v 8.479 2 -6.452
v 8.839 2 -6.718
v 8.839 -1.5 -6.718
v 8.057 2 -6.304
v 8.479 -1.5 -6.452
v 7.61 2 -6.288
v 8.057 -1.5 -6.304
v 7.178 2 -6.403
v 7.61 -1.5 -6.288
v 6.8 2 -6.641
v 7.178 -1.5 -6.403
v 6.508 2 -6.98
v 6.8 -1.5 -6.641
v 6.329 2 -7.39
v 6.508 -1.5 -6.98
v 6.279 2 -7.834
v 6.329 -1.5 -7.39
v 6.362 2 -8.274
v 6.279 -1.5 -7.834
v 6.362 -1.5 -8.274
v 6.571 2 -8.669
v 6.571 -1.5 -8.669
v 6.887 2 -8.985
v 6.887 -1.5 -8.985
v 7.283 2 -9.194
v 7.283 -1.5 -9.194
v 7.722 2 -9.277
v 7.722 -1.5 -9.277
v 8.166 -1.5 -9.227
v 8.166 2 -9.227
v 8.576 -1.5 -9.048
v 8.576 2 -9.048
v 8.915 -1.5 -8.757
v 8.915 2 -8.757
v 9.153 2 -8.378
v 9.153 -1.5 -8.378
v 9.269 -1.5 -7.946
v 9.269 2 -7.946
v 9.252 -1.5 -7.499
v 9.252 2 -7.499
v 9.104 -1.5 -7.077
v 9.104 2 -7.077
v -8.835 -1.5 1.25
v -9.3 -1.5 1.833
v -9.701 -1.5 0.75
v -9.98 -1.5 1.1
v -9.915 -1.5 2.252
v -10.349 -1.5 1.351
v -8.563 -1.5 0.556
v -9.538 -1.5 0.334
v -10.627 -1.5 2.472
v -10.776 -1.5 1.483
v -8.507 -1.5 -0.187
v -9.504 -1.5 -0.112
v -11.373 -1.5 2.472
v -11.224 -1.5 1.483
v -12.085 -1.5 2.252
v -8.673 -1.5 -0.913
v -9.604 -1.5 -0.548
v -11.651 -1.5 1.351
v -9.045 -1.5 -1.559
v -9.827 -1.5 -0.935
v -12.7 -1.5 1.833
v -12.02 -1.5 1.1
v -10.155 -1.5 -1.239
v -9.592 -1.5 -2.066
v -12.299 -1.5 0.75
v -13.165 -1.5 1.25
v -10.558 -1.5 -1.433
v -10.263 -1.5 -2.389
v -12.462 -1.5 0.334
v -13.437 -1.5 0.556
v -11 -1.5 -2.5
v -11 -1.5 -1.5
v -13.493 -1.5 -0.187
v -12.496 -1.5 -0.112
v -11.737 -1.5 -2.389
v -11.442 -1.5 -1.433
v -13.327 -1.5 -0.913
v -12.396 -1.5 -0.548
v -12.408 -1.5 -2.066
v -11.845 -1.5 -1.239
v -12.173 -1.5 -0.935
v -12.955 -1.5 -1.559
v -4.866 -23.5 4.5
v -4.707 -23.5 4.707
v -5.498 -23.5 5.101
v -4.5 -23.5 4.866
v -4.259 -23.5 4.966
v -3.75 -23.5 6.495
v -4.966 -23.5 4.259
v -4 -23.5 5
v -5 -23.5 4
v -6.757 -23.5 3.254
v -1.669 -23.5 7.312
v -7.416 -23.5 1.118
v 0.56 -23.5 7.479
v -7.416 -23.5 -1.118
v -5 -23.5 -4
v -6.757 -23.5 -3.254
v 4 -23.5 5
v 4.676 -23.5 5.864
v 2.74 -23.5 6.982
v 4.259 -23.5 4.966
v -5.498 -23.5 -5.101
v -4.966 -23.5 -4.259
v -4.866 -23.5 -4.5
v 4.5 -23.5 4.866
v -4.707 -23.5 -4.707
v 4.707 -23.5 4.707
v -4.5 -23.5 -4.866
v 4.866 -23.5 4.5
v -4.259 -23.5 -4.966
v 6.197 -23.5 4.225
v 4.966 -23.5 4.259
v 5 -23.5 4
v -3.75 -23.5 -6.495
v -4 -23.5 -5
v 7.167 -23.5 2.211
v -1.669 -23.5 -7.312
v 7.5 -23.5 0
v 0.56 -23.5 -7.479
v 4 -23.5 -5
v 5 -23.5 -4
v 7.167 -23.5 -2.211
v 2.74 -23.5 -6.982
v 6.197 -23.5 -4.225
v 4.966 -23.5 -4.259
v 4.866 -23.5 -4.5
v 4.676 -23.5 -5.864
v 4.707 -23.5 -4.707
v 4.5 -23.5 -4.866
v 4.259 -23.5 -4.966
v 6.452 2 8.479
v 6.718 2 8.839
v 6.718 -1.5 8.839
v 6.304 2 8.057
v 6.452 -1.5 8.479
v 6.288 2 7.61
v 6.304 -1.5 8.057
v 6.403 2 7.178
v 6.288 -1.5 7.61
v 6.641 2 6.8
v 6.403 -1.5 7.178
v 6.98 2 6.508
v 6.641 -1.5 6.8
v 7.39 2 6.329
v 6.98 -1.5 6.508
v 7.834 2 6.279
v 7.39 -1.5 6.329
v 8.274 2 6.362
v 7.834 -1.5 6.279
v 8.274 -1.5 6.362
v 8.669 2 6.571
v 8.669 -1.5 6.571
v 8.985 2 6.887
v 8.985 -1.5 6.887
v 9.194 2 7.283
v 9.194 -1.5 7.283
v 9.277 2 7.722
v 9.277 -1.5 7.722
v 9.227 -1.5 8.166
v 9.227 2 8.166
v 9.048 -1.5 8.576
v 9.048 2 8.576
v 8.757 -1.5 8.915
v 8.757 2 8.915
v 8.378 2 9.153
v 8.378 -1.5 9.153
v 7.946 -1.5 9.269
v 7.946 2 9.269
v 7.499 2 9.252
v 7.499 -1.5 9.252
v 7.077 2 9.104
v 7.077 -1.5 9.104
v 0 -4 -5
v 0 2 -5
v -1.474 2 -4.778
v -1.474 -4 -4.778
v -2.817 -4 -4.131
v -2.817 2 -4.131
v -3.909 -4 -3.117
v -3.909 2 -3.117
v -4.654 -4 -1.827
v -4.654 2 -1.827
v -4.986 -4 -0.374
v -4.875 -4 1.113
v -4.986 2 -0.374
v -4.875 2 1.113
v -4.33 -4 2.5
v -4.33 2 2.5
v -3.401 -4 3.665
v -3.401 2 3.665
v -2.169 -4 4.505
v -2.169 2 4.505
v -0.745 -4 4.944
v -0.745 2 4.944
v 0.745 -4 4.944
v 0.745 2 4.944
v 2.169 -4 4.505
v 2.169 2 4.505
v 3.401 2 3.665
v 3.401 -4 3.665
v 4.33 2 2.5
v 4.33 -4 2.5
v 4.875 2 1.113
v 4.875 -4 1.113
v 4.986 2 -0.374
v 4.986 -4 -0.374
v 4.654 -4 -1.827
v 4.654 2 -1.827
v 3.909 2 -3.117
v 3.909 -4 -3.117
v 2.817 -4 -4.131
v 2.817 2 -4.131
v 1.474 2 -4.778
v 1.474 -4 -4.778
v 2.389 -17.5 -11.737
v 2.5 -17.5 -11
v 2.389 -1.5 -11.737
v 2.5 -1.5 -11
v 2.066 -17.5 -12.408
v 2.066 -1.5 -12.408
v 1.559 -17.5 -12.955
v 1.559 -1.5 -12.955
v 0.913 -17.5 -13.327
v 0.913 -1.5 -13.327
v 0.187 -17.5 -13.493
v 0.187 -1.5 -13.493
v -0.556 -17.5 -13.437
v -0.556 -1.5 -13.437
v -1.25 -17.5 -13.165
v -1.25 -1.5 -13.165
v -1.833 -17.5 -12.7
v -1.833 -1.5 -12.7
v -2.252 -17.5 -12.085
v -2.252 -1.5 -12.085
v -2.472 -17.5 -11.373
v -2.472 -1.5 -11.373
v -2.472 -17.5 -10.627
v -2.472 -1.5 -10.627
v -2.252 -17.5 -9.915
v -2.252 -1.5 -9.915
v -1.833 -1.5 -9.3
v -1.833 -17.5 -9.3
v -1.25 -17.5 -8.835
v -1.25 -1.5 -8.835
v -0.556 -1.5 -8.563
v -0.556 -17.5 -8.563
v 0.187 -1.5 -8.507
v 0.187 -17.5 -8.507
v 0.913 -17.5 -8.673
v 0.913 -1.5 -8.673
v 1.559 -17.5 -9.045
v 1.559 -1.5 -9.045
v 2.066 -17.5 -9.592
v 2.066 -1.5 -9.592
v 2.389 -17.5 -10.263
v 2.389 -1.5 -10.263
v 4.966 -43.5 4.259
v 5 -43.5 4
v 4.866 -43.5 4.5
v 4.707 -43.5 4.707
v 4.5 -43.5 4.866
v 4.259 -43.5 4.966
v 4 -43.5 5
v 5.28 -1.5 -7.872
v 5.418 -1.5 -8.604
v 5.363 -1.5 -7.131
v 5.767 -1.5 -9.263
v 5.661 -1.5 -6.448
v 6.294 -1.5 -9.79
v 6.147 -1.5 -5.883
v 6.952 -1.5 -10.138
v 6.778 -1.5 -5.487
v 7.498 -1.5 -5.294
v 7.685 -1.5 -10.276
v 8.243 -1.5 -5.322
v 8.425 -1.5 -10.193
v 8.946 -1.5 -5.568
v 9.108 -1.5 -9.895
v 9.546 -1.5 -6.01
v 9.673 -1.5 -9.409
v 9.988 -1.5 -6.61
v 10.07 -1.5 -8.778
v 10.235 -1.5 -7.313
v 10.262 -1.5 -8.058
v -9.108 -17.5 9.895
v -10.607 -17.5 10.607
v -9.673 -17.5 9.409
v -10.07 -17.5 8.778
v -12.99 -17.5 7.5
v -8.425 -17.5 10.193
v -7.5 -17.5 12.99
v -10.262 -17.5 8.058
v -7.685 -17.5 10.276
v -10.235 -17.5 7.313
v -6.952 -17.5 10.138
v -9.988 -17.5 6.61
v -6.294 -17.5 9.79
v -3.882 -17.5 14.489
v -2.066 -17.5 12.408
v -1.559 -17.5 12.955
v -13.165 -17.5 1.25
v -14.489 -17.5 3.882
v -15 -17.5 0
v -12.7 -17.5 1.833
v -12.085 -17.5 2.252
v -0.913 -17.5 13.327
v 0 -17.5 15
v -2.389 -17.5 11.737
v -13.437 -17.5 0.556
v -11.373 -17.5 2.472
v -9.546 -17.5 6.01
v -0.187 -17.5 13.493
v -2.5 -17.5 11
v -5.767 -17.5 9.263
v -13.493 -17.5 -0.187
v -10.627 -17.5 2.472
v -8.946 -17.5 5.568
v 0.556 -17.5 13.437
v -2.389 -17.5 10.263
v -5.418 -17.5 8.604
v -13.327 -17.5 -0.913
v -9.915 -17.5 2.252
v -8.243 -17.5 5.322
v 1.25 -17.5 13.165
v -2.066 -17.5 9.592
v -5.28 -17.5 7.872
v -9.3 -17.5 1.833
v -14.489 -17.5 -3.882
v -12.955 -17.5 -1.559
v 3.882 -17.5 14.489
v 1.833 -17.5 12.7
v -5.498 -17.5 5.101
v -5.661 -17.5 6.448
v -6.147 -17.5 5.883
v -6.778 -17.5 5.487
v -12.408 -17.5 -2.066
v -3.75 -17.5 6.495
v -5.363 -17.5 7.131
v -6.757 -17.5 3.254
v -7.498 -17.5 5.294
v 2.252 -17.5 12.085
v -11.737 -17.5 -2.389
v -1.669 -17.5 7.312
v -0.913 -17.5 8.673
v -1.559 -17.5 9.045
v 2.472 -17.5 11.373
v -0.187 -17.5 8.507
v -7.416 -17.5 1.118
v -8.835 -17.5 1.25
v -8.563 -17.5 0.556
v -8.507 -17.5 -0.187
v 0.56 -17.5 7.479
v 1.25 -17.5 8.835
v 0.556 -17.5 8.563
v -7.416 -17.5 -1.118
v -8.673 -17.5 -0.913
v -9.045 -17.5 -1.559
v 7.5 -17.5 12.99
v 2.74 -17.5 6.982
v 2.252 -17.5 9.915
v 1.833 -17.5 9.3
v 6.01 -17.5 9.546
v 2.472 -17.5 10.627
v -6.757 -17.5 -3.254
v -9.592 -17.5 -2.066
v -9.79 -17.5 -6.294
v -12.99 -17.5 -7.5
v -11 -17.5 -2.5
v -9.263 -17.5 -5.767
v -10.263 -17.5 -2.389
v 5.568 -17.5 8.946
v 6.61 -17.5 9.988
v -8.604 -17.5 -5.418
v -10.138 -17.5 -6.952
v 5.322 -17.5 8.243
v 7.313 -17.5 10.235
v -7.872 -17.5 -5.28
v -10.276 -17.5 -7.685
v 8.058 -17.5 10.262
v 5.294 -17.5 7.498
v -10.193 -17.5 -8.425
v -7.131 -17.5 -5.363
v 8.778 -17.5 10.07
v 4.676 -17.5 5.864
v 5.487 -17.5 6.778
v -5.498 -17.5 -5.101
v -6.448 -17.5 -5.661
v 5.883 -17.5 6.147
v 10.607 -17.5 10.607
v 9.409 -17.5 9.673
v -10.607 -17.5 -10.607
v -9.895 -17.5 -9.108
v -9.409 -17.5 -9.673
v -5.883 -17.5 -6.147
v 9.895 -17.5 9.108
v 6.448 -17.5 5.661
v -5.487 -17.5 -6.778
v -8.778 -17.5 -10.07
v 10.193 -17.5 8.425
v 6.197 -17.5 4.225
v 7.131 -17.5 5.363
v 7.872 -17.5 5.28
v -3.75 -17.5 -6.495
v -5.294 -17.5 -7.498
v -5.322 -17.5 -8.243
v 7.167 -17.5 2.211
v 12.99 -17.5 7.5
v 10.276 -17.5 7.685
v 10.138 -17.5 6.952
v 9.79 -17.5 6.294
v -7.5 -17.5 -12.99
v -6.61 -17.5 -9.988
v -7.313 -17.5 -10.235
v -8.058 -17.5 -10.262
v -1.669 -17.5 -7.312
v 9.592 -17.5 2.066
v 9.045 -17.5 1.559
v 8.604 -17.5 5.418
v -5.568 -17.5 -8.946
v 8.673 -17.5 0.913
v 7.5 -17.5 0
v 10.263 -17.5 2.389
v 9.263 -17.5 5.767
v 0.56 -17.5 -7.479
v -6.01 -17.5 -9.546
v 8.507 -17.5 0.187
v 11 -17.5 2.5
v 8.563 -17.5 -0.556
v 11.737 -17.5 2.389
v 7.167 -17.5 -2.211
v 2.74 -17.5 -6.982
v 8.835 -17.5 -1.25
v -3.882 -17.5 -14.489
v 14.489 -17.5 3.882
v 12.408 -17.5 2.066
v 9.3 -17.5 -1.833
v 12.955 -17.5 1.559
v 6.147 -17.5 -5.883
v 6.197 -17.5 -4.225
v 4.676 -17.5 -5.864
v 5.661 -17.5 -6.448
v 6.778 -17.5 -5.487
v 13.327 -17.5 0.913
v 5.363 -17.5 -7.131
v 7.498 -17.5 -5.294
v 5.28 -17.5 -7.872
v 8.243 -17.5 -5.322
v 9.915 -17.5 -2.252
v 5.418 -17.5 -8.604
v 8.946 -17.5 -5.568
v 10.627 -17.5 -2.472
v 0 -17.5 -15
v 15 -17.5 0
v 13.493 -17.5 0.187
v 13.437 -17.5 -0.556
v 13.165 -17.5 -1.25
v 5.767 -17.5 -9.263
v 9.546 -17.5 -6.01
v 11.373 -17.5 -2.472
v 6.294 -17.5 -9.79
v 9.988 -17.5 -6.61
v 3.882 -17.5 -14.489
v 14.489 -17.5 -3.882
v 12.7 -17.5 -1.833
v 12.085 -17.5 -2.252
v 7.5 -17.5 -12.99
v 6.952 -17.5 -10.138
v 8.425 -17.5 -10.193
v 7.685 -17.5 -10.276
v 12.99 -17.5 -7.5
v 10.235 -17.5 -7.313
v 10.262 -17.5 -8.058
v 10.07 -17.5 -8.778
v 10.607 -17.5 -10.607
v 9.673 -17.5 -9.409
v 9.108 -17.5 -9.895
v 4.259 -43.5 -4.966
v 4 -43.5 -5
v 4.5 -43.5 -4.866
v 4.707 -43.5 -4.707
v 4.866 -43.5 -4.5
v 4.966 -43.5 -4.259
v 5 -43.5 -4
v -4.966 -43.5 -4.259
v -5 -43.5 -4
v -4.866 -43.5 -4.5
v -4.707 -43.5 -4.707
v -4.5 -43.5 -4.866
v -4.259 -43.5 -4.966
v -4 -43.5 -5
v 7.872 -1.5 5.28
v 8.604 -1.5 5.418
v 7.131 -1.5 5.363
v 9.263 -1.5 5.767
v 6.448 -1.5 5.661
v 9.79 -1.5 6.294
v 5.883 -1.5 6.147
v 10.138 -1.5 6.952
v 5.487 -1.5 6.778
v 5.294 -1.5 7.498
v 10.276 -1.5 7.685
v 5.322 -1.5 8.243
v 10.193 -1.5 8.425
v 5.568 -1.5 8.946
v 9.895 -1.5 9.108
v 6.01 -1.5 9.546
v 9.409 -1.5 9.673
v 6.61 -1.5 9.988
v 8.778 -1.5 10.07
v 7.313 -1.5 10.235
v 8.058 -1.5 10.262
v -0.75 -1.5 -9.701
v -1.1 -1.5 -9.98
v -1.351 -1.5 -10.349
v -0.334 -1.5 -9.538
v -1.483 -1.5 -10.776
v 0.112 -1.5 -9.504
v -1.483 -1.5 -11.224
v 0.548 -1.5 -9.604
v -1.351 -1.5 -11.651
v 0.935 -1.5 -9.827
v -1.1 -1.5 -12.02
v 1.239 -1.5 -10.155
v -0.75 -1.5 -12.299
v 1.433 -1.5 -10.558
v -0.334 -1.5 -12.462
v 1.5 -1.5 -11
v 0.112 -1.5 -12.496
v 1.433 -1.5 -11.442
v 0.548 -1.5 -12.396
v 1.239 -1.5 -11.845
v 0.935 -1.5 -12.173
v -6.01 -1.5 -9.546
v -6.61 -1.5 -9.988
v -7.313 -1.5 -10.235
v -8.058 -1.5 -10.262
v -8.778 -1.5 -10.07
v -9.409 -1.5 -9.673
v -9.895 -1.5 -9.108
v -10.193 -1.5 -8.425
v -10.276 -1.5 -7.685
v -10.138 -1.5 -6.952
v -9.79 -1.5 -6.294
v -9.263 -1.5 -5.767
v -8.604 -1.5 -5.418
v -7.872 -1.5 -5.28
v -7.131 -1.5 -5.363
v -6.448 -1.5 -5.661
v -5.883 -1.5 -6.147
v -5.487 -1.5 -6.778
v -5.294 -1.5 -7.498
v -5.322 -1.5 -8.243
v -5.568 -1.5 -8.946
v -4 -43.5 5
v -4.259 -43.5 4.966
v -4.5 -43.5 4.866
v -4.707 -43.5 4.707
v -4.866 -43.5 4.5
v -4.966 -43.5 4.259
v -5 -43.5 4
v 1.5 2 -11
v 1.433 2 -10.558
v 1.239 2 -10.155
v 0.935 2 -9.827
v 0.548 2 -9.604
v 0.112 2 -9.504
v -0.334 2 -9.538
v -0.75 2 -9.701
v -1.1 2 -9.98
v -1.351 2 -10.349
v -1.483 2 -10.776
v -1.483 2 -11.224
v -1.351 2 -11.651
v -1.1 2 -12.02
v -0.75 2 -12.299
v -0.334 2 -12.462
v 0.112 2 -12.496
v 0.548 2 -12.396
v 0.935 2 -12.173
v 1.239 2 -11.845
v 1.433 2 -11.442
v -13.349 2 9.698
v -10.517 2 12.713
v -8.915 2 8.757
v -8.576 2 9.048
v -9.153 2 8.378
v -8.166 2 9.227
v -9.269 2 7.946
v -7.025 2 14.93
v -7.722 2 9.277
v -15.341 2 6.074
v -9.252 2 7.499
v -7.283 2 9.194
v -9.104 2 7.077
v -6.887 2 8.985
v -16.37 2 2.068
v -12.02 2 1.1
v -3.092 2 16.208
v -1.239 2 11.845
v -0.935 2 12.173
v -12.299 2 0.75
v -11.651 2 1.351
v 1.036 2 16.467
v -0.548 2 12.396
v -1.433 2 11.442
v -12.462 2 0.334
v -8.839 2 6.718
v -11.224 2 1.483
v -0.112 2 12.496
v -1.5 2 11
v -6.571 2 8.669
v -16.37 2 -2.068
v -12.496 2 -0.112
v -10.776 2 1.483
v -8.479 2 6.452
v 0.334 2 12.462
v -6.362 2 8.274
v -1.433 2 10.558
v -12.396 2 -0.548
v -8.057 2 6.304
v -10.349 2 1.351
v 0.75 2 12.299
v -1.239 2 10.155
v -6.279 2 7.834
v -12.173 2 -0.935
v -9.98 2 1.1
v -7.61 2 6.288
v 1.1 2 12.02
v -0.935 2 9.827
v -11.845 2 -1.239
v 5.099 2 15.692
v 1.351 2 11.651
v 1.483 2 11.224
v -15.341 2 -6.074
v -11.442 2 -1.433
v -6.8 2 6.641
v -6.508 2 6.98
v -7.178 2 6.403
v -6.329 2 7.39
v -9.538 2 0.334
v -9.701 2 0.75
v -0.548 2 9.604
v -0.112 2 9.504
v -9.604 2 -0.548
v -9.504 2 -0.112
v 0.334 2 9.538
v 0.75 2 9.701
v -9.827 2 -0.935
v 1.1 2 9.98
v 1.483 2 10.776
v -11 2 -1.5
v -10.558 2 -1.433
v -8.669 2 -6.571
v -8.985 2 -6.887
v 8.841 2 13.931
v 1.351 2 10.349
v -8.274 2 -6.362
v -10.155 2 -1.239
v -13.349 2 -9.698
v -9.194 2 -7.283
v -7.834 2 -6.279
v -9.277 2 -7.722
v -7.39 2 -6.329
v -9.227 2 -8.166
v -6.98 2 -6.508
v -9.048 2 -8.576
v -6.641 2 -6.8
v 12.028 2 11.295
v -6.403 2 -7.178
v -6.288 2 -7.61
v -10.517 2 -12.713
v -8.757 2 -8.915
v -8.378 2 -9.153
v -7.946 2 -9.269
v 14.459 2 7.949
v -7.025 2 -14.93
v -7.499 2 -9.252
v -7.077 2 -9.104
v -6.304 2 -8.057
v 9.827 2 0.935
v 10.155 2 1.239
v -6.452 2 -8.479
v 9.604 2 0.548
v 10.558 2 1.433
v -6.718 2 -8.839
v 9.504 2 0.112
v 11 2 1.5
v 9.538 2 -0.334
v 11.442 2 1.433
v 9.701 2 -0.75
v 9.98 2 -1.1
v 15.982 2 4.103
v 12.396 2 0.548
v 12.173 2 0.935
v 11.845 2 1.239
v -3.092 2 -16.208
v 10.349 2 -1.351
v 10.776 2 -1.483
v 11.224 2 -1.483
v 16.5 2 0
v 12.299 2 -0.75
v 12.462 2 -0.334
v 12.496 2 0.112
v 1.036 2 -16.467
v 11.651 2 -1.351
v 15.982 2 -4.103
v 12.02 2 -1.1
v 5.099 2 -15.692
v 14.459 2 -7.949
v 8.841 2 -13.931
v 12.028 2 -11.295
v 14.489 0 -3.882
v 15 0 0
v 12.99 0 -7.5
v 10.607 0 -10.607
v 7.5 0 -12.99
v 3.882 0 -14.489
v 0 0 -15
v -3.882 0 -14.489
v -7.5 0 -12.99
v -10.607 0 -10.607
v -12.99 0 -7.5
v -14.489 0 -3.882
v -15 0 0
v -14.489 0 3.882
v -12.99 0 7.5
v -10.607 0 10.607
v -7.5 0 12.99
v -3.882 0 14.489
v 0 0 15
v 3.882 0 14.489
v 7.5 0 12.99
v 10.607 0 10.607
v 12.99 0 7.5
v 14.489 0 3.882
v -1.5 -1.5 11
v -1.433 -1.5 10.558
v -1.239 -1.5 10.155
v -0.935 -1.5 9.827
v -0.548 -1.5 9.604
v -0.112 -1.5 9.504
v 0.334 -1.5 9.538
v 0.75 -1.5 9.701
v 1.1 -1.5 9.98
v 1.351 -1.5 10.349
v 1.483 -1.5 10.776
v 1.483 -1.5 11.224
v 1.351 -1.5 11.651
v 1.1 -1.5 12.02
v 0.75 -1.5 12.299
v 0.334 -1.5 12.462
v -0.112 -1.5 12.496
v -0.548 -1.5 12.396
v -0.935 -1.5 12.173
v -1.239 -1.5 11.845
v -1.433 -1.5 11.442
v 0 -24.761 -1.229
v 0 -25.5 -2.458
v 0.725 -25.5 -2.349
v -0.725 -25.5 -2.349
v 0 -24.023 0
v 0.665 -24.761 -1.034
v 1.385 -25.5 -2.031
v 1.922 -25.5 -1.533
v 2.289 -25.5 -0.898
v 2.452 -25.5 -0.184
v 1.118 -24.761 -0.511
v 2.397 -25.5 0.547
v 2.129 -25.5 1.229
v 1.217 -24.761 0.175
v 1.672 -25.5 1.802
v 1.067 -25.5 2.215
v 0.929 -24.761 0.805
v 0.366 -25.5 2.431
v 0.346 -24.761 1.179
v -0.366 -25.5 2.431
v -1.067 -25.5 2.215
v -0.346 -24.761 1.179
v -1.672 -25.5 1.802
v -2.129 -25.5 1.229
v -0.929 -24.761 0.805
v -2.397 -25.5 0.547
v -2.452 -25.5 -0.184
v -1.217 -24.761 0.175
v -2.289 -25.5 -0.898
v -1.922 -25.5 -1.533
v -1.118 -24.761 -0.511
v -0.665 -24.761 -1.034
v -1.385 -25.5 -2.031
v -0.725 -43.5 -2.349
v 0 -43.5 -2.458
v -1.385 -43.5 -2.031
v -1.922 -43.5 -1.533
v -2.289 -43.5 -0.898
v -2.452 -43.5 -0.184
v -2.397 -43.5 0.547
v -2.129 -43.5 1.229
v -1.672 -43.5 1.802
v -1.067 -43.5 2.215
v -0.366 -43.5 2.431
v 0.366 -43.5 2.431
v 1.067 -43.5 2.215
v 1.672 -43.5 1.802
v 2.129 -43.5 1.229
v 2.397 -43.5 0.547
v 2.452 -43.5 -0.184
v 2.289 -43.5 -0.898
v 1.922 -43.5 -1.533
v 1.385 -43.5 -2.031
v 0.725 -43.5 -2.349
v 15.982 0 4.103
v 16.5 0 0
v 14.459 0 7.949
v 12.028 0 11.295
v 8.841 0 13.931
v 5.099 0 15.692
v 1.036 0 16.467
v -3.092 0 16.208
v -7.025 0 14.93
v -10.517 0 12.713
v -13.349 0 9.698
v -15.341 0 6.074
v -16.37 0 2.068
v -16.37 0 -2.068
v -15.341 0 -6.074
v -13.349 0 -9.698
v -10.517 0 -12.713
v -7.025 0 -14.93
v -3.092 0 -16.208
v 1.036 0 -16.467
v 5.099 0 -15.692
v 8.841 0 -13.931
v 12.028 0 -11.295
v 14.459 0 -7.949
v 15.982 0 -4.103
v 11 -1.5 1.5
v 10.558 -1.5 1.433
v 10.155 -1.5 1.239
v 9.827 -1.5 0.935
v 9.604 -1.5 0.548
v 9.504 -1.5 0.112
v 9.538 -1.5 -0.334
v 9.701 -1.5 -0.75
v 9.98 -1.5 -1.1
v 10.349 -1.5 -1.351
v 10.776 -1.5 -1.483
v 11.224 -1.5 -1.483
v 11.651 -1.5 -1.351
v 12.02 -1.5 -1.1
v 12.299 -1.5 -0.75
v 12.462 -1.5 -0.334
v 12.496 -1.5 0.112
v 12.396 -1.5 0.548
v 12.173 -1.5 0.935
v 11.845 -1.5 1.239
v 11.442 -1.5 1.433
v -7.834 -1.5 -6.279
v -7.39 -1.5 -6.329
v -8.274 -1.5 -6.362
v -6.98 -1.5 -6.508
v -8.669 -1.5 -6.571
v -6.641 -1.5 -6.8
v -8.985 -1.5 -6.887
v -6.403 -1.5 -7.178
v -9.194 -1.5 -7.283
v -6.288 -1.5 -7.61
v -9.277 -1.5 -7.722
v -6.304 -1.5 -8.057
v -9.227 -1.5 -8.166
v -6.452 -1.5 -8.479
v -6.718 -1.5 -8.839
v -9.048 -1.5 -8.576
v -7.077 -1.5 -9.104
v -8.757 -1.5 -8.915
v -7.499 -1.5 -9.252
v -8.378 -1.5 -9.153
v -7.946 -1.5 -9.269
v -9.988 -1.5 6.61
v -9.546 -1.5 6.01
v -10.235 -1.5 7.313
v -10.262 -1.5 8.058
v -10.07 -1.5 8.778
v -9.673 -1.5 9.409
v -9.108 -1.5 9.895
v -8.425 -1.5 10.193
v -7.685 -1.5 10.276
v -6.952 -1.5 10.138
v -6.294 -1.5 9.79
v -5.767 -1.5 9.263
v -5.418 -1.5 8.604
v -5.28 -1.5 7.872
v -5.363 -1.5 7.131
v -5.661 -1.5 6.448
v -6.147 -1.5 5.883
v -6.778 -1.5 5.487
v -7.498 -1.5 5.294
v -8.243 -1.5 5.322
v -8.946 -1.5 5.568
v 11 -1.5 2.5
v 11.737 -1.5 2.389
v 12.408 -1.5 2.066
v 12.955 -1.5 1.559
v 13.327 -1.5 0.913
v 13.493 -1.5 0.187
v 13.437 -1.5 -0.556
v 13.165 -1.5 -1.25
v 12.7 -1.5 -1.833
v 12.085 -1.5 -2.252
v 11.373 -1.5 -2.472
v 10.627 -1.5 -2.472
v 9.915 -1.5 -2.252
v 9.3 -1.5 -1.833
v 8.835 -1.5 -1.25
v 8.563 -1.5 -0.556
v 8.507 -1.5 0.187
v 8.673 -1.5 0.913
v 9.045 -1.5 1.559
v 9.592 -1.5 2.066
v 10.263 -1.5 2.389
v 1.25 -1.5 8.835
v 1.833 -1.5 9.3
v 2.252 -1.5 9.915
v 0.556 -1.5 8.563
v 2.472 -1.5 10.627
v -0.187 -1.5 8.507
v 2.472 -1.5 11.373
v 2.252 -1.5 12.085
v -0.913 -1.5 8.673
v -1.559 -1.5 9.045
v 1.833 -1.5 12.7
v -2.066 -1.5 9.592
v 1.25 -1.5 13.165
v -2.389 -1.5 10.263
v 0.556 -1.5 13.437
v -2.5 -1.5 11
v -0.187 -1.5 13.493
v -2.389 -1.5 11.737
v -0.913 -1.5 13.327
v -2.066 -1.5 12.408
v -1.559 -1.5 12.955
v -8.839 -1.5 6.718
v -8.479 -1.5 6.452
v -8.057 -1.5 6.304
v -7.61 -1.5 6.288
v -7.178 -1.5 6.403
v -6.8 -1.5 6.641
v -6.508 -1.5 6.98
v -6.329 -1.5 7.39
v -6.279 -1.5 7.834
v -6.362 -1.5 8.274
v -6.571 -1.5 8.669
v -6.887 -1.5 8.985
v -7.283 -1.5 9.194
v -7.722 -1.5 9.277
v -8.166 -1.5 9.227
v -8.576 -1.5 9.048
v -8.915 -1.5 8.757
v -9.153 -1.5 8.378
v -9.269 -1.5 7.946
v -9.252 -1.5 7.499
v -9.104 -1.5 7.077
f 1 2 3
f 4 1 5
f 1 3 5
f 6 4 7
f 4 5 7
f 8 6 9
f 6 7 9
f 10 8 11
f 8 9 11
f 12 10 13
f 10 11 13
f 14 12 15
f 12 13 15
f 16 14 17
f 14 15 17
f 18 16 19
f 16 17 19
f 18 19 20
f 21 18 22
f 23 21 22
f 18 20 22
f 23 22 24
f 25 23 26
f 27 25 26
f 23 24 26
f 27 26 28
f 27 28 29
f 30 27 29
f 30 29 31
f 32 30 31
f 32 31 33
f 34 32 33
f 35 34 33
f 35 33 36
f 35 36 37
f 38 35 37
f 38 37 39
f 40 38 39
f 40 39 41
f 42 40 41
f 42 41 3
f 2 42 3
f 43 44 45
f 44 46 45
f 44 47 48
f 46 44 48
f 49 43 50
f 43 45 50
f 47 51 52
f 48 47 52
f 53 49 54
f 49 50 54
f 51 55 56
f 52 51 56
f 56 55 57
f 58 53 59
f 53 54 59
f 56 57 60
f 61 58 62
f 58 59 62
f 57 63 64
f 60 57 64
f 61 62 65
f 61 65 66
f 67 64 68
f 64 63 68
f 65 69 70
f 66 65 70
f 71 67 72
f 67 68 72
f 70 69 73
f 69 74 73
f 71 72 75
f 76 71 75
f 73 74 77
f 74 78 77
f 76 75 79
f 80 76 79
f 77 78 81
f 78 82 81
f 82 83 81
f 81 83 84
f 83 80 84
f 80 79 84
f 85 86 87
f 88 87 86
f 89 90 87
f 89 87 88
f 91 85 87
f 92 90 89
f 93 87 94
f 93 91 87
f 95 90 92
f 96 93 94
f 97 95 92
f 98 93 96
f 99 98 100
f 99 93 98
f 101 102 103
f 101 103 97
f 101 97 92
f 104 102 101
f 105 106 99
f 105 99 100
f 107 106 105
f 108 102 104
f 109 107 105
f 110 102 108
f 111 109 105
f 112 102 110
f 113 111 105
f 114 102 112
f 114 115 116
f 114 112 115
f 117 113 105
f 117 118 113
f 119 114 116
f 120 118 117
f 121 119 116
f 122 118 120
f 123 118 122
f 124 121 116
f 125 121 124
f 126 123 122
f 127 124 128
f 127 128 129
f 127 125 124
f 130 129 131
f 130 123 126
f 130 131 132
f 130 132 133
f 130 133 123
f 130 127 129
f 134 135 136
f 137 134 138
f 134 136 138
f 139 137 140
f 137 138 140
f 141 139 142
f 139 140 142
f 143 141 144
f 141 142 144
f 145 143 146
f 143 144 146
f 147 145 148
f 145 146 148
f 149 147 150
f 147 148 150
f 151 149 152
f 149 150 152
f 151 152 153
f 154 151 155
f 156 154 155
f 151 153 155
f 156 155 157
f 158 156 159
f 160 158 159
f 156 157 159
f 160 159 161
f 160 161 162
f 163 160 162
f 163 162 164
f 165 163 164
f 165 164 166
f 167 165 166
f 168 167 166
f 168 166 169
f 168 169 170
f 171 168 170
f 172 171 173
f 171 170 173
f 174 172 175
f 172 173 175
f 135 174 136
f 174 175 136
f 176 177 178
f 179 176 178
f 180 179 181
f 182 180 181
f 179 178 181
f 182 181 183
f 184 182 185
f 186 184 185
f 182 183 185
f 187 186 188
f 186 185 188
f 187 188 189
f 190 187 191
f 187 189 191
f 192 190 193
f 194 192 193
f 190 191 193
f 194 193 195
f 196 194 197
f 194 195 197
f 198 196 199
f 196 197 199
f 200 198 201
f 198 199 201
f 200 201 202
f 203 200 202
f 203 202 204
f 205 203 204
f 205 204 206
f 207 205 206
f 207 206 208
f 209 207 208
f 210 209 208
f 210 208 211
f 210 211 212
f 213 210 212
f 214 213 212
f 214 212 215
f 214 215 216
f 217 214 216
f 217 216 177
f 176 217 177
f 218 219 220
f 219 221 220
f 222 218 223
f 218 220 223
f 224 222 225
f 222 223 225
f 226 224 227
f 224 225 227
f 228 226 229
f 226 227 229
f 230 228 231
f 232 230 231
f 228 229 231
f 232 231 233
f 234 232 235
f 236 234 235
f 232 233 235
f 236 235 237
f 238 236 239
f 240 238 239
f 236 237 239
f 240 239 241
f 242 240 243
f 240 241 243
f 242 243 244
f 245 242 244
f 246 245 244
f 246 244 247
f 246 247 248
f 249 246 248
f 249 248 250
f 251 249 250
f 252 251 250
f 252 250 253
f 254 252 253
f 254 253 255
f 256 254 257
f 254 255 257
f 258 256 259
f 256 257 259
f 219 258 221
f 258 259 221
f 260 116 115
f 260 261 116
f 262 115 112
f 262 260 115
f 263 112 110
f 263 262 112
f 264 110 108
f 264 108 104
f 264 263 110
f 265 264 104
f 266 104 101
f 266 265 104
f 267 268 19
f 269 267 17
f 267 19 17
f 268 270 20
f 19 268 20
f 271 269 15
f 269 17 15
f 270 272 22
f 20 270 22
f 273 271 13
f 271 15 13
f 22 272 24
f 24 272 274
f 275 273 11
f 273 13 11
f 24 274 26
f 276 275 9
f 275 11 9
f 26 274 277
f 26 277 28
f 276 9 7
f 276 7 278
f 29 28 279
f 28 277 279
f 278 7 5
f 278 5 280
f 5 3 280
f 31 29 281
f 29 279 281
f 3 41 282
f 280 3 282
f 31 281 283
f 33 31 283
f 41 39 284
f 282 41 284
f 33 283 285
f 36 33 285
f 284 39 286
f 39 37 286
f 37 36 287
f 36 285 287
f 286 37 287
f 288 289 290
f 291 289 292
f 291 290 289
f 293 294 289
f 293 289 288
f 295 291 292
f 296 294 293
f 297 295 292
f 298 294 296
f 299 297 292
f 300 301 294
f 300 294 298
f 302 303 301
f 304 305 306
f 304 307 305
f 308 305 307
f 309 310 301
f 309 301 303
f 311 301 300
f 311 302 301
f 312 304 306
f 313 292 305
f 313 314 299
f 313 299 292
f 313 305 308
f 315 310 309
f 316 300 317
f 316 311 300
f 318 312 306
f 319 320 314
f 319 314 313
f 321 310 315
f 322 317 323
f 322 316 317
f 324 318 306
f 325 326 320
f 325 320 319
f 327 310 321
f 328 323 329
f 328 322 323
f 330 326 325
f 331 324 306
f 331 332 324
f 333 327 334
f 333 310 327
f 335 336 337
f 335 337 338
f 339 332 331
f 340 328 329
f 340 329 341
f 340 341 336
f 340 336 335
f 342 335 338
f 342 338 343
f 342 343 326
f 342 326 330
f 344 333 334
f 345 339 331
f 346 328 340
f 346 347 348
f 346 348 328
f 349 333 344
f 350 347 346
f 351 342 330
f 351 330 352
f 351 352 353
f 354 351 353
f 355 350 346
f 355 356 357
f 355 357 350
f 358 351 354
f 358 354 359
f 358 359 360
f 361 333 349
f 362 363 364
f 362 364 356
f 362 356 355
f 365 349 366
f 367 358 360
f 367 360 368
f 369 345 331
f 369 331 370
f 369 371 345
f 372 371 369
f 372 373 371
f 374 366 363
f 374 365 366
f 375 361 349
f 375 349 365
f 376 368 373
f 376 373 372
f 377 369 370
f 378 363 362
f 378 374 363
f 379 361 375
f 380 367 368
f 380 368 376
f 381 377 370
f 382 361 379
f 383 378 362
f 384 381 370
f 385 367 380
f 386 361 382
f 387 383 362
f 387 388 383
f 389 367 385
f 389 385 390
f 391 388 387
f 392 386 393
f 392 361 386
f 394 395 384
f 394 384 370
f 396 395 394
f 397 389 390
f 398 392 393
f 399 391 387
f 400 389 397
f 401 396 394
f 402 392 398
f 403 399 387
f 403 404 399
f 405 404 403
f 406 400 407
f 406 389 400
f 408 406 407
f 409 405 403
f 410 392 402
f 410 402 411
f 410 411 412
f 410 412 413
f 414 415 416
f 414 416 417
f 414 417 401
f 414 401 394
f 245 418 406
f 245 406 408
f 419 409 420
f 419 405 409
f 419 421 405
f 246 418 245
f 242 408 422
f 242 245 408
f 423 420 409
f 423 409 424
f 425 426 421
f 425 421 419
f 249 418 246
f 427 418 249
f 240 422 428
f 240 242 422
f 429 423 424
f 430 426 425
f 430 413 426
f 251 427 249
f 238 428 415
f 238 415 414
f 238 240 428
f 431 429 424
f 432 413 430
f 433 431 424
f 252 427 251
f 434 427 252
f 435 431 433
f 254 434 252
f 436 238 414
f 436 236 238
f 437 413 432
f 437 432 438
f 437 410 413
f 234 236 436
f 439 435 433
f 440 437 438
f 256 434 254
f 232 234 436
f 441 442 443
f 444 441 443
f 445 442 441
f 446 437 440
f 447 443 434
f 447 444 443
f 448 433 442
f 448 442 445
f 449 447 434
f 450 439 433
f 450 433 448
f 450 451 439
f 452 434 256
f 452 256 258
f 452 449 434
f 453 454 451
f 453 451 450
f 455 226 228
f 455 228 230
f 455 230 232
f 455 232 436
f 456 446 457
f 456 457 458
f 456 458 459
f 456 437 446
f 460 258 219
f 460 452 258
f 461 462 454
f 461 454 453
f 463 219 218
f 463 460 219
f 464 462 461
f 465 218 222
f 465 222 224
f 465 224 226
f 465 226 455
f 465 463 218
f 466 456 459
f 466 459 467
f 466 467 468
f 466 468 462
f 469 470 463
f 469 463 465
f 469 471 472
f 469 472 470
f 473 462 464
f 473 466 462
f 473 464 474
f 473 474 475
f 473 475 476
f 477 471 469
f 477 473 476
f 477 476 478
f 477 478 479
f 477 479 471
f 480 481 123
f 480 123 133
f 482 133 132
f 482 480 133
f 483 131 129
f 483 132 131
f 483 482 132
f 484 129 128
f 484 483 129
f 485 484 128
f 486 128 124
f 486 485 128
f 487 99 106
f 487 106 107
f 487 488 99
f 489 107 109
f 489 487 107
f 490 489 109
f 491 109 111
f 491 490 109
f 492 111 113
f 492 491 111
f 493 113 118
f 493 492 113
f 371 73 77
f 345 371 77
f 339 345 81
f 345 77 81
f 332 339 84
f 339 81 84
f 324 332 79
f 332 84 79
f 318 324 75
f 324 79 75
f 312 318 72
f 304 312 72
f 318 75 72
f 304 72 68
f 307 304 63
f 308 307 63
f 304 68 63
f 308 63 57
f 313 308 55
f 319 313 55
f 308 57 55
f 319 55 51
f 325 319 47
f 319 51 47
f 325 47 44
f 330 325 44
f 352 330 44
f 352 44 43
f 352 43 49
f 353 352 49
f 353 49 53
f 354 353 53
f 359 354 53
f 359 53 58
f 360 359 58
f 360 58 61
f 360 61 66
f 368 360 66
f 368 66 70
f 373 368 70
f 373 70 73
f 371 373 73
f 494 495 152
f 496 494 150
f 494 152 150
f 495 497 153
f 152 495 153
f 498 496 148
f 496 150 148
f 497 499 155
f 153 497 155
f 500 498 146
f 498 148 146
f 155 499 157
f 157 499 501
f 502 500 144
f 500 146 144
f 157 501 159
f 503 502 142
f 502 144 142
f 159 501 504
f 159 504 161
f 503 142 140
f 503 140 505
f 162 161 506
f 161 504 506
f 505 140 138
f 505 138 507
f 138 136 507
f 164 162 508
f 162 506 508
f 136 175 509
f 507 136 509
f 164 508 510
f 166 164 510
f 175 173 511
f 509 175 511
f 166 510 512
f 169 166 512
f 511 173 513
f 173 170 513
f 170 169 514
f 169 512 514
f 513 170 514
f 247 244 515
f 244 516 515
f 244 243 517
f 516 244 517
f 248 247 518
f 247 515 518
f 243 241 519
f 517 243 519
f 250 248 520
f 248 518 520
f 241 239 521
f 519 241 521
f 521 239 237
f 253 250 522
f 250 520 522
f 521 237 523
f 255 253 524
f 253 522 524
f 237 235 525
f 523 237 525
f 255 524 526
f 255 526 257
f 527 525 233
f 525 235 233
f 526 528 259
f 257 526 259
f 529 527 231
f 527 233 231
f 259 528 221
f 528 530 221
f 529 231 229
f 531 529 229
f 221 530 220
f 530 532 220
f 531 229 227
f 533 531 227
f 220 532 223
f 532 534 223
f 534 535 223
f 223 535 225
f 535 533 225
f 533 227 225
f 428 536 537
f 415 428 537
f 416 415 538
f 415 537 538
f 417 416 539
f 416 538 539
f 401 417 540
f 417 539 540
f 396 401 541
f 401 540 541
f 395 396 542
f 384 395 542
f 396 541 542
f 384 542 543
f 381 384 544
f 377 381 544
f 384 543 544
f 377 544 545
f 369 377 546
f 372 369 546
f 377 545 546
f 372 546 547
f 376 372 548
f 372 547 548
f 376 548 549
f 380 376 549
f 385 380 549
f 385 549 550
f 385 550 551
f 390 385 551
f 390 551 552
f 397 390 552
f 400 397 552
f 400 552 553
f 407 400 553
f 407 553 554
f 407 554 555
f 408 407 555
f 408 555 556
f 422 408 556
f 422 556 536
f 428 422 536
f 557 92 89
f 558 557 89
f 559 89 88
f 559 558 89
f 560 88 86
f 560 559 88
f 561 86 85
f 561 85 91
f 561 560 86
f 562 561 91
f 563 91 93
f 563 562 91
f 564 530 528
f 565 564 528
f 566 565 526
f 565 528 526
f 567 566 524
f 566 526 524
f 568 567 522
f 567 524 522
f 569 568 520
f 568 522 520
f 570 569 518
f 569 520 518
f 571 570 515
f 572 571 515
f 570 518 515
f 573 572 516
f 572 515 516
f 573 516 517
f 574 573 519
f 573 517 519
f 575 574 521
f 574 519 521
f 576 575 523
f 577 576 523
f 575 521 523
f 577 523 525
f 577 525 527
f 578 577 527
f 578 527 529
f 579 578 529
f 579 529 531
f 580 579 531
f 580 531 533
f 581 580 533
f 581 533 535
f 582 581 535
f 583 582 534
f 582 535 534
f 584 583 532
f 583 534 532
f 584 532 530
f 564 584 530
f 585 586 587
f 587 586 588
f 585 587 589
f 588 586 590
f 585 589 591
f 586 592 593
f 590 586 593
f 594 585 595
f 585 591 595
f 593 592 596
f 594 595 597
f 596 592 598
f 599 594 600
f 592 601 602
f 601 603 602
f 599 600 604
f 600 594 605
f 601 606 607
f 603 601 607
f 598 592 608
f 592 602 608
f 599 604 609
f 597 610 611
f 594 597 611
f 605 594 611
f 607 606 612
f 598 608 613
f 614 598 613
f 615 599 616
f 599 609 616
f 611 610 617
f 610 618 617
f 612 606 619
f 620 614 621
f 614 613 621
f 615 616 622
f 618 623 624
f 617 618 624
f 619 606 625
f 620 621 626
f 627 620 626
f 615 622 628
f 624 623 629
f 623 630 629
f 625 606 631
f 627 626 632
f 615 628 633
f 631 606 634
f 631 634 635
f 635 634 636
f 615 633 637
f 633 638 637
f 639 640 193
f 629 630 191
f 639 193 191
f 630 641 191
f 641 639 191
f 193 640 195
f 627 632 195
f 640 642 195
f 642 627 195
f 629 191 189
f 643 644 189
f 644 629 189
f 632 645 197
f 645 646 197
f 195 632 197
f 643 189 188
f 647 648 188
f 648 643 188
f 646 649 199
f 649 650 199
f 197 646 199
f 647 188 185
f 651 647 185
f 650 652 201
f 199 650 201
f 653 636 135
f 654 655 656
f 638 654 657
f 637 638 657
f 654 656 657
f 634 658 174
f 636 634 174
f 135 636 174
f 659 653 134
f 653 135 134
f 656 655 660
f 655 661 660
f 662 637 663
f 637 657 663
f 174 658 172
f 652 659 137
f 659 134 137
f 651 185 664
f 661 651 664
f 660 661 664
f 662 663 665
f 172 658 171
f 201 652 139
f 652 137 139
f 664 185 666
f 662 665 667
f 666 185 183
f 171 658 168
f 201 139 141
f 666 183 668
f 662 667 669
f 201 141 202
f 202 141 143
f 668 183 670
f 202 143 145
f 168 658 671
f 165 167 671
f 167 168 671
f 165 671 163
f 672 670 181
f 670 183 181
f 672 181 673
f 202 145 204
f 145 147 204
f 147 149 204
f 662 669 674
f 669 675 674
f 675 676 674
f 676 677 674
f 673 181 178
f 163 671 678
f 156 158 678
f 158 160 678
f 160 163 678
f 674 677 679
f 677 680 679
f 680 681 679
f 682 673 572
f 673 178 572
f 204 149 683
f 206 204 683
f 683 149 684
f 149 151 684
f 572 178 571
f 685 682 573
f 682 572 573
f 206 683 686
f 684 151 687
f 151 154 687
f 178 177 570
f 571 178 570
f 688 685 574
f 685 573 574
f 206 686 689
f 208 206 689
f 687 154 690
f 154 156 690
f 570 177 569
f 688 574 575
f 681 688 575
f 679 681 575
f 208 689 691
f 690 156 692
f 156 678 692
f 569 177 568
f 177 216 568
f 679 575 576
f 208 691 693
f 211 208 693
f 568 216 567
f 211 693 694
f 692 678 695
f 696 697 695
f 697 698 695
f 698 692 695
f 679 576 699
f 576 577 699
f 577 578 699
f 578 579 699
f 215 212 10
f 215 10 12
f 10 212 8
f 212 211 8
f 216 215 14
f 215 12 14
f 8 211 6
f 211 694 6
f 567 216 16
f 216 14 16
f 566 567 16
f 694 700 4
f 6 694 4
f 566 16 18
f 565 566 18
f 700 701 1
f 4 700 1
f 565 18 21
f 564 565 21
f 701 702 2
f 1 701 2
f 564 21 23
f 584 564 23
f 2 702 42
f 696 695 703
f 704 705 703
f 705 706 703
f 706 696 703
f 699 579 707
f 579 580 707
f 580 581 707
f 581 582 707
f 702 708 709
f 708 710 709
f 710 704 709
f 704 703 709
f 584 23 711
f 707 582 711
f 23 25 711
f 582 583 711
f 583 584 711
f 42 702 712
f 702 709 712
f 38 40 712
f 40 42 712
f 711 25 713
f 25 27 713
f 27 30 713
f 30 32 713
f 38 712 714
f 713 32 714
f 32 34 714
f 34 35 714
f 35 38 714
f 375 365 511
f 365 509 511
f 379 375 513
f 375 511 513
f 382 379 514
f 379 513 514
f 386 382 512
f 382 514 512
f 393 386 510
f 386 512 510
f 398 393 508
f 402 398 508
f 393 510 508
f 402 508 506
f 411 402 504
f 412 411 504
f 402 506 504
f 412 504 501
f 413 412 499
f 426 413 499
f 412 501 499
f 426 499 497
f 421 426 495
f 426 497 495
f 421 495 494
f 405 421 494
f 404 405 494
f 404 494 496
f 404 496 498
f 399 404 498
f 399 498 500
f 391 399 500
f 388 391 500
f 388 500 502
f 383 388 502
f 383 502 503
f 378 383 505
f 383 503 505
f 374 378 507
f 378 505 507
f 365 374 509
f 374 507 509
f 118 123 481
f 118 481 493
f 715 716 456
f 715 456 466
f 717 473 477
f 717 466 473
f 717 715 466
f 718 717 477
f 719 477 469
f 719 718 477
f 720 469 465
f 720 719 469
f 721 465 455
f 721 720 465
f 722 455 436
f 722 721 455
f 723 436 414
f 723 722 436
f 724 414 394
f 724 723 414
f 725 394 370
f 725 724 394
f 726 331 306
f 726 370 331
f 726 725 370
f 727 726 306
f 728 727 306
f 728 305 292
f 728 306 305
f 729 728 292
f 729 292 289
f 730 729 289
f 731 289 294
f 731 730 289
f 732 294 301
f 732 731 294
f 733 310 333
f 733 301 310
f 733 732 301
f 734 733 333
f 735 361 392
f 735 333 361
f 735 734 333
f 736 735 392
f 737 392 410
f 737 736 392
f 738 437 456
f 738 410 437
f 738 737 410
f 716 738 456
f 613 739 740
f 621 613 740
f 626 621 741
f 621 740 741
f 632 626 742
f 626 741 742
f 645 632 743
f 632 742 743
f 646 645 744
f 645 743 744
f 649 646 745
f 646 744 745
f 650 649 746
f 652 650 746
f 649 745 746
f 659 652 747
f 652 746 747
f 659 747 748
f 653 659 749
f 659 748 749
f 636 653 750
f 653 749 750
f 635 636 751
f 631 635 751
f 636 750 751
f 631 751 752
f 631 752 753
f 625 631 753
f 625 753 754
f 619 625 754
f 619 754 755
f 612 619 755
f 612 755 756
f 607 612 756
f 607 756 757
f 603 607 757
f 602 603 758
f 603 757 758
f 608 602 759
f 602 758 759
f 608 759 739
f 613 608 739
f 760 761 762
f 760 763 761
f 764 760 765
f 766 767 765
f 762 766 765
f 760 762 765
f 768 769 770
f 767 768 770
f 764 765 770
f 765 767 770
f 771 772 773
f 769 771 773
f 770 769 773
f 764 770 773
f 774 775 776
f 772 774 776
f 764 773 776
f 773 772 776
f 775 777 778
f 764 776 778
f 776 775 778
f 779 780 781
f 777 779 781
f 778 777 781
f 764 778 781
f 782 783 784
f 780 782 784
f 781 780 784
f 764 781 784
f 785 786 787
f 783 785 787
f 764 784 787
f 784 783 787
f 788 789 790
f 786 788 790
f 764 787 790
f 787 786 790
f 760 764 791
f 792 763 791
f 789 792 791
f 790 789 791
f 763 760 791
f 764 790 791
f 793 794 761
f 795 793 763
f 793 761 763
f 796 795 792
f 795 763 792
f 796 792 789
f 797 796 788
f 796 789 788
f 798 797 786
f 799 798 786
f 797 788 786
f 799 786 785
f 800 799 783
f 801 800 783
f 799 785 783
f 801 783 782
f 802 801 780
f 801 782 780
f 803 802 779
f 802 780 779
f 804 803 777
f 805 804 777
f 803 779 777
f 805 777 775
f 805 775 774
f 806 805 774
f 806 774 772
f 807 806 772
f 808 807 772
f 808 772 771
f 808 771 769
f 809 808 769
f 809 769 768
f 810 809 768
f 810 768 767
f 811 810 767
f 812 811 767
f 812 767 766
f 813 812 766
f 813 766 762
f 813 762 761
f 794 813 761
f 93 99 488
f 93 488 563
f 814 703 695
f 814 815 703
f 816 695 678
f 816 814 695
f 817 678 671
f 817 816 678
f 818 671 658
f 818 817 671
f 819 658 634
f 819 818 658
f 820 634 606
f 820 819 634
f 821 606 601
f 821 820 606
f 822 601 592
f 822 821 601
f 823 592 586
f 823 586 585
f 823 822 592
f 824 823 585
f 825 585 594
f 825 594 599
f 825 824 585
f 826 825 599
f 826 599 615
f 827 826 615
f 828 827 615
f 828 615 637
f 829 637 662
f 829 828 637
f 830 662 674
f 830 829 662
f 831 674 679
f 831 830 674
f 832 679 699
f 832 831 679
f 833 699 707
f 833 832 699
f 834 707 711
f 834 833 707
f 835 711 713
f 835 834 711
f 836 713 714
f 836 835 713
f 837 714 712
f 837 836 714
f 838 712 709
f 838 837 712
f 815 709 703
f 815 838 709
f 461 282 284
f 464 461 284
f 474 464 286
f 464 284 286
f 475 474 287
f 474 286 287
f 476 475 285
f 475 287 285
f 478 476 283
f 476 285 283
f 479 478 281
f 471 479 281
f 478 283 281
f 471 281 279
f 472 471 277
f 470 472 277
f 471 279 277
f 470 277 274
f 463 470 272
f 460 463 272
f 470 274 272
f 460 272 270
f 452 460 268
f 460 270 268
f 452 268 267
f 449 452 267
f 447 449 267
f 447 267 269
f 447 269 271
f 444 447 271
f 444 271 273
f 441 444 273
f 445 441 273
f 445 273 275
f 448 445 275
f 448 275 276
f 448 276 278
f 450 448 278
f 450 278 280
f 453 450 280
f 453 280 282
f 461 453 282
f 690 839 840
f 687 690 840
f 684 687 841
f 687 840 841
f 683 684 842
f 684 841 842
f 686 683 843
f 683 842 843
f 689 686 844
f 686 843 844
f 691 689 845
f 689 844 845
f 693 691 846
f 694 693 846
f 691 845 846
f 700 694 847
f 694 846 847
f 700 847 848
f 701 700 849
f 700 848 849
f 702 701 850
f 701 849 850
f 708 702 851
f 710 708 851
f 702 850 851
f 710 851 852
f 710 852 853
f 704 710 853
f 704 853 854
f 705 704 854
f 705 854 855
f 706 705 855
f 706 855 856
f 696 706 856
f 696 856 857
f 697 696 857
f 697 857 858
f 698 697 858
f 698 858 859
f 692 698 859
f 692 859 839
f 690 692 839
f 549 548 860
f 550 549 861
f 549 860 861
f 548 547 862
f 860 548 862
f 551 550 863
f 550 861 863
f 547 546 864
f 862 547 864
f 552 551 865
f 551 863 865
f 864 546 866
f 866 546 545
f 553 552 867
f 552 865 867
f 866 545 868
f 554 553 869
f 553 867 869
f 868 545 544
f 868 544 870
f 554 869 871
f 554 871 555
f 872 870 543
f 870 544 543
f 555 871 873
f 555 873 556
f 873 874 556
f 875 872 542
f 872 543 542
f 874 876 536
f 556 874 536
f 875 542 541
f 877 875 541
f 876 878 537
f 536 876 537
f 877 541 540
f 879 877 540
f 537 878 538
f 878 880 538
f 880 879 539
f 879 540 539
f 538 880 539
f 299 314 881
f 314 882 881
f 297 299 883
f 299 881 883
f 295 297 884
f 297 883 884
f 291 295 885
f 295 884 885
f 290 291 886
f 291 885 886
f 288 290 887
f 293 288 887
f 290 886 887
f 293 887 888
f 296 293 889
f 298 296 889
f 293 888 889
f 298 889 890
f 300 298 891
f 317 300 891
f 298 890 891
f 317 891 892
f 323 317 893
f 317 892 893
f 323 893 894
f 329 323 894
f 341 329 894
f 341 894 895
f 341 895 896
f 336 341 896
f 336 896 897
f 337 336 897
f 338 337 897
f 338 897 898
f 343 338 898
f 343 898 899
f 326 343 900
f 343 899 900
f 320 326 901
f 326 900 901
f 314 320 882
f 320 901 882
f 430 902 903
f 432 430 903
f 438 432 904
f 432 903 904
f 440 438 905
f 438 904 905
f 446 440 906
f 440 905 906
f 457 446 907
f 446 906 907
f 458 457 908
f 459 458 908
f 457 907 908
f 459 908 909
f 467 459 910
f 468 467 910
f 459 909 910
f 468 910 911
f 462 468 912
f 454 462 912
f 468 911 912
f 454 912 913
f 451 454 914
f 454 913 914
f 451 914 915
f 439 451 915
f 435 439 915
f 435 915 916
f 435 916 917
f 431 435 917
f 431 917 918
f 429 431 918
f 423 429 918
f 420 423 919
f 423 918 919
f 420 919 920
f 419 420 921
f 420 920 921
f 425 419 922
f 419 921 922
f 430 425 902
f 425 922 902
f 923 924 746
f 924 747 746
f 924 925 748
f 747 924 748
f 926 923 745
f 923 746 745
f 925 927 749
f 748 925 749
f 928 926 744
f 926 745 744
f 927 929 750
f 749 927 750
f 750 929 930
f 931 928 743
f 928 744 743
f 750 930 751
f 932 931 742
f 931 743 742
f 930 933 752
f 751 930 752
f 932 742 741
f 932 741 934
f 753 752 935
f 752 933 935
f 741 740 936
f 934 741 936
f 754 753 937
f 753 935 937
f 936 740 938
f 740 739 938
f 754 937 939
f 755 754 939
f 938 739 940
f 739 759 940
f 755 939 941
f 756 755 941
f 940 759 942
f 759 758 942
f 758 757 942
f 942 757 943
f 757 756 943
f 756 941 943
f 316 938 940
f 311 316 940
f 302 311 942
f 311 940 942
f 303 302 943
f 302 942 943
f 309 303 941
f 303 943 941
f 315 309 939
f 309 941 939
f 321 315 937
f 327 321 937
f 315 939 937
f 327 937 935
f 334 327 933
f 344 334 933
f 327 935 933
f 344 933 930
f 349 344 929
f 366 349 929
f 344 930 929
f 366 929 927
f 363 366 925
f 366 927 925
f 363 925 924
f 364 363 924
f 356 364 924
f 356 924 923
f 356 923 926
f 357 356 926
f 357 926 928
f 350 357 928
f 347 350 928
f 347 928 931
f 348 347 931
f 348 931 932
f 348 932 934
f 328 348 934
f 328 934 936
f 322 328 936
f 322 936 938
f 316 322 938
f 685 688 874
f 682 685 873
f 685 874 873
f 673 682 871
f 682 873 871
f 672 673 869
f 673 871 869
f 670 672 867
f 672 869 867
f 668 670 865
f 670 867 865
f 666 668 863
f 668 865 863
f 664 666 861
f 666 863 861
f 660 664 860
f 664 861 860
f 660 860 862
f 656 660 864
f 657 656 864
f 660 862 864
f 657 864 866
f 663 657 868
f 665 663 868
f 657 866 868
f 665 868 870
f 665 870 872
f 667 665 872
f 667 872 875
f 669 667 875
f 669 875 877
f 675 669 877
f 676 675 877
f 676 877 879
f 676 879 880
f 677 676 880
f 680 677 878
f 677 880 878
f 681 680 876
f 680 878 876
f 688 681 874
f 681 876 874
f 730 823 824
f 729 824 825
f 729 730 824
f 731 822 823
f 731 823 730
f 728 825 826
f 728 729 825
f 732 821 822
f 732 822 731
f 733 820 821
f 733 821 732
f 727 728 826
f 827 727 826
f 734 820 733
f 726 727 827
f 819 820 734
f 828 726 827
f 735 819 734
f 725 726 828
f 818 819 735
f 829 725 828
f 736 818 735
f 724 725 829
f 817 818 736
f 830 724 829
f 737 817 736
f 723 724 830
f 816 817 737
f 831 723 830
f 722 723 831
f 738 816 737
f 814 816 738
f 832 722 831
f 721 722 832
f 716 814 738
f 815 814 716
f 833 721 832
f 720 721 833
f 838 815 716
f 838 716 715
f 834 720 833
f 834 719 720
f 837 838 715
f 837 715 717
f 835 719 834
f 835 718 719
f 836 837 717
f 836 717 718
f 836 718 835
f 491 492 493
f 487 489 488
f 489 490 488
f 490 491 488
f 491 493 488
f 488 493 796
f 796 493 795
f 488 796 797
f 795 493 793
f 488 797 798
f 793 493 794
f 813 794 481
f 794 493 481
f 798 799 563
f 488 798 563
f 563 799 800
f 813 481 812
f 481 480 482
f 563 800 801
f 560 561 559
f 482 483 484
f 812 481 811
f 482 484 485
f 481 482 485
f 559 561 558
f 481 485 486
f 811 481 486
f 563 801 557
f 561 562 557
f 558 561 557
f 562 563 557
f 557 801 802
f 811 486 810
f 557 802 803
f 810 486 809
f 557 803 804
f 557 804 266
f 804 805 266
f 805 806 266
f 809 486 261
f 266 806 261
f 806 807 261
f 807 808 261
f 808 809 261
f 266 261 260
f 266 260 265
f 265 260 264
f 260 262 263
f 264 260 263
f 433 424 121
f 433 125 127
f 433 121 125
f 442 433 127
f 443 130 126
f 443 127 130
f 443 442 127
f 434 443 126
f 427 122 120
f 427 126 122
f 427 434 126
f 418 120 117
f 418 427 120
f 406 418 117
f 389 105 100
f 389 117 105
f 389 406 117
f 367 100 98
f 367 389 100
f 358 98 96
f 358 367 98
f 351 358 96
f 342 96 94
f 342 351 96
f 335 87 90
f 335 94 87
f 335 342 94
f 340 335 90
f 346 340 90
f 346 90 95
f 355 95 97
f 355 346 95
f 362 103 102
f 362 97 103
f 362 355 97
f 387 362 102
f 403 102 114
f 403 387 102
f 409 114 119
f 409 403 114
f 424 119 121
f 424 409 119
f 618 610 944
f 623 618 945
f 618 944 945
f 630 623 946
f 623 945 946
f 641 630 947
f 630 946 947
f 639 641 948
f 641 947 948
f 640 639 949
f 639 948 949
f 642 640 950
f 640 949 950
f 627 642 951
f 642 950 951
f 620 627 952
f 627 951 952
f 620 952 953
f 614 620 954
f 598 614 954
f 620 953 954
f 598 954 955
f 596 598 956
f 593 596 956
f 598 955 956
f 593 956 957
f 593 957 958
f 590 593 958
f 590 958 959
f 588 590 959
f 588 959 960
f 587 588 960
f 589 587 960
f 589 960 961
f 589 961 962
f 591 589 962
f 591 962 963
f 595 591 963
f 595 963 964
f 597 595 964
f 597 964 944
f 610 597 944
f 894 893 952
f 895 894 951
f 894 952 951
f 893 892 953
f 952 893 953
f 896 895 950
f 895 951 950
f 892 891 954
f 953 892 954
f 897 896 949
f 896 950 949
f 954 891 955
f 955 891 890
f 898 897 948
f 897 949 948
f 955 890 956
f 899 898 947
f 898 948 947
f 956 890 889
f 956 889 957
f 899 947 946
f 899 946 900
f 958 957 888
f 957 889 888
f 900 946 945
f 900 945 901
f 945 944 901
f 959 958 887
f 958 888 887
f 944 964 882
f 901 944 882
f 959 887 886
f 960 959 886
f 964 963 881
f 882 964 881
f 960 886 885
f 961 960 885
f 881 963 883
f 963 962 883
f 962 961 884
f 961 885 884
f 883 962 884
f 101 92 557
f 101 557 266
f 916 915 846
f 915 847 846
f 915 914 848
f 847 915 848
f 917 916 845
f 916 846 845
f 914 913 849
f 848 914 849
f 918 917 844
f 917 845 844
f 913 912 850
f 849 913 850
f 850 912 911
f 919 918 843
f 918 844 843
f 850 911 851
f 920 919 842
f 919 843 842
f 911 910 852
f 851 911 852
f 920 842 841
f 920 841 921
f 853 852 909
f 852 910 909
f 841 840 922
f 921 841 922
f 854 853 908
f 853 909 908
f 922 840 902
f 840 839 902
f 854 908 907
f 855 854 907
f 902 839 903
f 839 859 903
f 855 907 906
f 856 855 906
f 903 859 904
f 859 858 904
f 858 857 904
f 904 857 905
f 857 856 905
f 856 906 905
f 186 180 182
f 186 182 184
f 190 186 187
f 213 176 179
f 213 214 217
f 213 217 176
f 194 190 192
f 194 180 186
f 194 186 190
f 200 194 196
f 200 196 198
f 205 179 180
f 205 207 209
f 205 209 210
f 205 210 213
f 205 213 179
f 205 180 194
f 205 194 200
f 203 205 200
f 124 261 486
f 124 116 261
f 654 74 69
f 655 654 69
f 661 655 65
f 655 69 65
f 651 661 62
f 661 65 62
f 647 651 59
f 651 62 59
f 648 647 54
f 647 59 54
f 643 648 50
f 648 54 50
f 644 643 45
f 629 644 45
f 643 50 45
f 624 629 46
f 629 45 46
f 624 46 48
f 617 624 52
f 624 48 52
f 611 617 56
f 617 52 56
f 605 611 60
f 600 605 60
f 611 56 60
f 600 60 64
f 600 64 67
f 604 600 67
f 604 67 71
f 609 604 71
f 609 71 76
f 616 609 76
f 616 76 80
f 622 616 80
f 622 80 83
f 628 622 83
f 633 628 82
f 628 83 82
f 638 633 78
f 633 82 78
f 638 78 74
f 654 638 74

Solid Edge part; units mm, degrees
sketch "Sketch1" plane through (0, 0, 0) normal (0, -1, 0) x (1, 0, 0)
  circle A0 centre (0, 0) radius 16.5
  dimension "D1" = 33
extrude "Protrusion1" add sketch "Sketch1" against normal blind 2
sketch "Sketch2" plane through (0, 0, 0) normal (0, -1, 0) x (1, 0, 0)
  circle A0 centre (0, 0) radius 15
  dimension "D1" = 30
extrude "ProtrusiónExtruida_2" add sketch "Sketch2" along normal blind 17.5
sketch "Sketch3" plane through (0, -17.5, 0) normal (0, -1, 0) x (1, 0, 0)
  circle A0 centre (0, 0) radius 7.5
  dimension "D1" = 15
extrude "ProtrusiónExtruida_3" add sketch "Sketch3" along normal blind 6
sketch "Sketch4" plane through (0, -23.5, 0) normal (0, -1, 0) x (1, 0, 0)
  line L0 (5, -5) -> (-5, -5)
  line L1 (-5, -5) -> (-5, 5)
  line L2 (-5, 5) -> (5, 5)
  line L3 (5, 5) -> (5, -5)
  dimension "D1" = 10
  dimension "D2" = 10
extrude "ProtrusiónExtruida_4" add sketch "Sketch4" along normal blind 20
hole "Agujero_1" at (-11, -17.5, 0) direction (0, 1, 0) diameter 3 end up to next counterbore diameter 5 counterbore depth 16
pattern_circular "Pattern1" count 8 over 360 about axis through (0, -17.5, 0) along (0, 1, 0) of "Agujero_1"
sketch "Sketch5" plane through (0, 2, 0) normal (0, 1, 0) x (0, 0, -1)
  circle A0 centre (0, 0) radius 5
  dimension "D1" = 10
extrude "VaciadoExtruido_1" cut sketch "Sketch5" against normal blind 6
fillet "Redondeo_1" radius 1 4 edges at (-5, -33.5, -5) (-5, -33.5, 5) (5, -33.5, 5) (5, -33.5, -5)
hole "Agujero_9" at (0, -43.5, 0) direction (0, 1, 0) diameter 4.917 depth 18 tip angle 118 thread major 6 thread length 15
properties part number "1976-1100-014" material "Aluminio, 7075-T6"
